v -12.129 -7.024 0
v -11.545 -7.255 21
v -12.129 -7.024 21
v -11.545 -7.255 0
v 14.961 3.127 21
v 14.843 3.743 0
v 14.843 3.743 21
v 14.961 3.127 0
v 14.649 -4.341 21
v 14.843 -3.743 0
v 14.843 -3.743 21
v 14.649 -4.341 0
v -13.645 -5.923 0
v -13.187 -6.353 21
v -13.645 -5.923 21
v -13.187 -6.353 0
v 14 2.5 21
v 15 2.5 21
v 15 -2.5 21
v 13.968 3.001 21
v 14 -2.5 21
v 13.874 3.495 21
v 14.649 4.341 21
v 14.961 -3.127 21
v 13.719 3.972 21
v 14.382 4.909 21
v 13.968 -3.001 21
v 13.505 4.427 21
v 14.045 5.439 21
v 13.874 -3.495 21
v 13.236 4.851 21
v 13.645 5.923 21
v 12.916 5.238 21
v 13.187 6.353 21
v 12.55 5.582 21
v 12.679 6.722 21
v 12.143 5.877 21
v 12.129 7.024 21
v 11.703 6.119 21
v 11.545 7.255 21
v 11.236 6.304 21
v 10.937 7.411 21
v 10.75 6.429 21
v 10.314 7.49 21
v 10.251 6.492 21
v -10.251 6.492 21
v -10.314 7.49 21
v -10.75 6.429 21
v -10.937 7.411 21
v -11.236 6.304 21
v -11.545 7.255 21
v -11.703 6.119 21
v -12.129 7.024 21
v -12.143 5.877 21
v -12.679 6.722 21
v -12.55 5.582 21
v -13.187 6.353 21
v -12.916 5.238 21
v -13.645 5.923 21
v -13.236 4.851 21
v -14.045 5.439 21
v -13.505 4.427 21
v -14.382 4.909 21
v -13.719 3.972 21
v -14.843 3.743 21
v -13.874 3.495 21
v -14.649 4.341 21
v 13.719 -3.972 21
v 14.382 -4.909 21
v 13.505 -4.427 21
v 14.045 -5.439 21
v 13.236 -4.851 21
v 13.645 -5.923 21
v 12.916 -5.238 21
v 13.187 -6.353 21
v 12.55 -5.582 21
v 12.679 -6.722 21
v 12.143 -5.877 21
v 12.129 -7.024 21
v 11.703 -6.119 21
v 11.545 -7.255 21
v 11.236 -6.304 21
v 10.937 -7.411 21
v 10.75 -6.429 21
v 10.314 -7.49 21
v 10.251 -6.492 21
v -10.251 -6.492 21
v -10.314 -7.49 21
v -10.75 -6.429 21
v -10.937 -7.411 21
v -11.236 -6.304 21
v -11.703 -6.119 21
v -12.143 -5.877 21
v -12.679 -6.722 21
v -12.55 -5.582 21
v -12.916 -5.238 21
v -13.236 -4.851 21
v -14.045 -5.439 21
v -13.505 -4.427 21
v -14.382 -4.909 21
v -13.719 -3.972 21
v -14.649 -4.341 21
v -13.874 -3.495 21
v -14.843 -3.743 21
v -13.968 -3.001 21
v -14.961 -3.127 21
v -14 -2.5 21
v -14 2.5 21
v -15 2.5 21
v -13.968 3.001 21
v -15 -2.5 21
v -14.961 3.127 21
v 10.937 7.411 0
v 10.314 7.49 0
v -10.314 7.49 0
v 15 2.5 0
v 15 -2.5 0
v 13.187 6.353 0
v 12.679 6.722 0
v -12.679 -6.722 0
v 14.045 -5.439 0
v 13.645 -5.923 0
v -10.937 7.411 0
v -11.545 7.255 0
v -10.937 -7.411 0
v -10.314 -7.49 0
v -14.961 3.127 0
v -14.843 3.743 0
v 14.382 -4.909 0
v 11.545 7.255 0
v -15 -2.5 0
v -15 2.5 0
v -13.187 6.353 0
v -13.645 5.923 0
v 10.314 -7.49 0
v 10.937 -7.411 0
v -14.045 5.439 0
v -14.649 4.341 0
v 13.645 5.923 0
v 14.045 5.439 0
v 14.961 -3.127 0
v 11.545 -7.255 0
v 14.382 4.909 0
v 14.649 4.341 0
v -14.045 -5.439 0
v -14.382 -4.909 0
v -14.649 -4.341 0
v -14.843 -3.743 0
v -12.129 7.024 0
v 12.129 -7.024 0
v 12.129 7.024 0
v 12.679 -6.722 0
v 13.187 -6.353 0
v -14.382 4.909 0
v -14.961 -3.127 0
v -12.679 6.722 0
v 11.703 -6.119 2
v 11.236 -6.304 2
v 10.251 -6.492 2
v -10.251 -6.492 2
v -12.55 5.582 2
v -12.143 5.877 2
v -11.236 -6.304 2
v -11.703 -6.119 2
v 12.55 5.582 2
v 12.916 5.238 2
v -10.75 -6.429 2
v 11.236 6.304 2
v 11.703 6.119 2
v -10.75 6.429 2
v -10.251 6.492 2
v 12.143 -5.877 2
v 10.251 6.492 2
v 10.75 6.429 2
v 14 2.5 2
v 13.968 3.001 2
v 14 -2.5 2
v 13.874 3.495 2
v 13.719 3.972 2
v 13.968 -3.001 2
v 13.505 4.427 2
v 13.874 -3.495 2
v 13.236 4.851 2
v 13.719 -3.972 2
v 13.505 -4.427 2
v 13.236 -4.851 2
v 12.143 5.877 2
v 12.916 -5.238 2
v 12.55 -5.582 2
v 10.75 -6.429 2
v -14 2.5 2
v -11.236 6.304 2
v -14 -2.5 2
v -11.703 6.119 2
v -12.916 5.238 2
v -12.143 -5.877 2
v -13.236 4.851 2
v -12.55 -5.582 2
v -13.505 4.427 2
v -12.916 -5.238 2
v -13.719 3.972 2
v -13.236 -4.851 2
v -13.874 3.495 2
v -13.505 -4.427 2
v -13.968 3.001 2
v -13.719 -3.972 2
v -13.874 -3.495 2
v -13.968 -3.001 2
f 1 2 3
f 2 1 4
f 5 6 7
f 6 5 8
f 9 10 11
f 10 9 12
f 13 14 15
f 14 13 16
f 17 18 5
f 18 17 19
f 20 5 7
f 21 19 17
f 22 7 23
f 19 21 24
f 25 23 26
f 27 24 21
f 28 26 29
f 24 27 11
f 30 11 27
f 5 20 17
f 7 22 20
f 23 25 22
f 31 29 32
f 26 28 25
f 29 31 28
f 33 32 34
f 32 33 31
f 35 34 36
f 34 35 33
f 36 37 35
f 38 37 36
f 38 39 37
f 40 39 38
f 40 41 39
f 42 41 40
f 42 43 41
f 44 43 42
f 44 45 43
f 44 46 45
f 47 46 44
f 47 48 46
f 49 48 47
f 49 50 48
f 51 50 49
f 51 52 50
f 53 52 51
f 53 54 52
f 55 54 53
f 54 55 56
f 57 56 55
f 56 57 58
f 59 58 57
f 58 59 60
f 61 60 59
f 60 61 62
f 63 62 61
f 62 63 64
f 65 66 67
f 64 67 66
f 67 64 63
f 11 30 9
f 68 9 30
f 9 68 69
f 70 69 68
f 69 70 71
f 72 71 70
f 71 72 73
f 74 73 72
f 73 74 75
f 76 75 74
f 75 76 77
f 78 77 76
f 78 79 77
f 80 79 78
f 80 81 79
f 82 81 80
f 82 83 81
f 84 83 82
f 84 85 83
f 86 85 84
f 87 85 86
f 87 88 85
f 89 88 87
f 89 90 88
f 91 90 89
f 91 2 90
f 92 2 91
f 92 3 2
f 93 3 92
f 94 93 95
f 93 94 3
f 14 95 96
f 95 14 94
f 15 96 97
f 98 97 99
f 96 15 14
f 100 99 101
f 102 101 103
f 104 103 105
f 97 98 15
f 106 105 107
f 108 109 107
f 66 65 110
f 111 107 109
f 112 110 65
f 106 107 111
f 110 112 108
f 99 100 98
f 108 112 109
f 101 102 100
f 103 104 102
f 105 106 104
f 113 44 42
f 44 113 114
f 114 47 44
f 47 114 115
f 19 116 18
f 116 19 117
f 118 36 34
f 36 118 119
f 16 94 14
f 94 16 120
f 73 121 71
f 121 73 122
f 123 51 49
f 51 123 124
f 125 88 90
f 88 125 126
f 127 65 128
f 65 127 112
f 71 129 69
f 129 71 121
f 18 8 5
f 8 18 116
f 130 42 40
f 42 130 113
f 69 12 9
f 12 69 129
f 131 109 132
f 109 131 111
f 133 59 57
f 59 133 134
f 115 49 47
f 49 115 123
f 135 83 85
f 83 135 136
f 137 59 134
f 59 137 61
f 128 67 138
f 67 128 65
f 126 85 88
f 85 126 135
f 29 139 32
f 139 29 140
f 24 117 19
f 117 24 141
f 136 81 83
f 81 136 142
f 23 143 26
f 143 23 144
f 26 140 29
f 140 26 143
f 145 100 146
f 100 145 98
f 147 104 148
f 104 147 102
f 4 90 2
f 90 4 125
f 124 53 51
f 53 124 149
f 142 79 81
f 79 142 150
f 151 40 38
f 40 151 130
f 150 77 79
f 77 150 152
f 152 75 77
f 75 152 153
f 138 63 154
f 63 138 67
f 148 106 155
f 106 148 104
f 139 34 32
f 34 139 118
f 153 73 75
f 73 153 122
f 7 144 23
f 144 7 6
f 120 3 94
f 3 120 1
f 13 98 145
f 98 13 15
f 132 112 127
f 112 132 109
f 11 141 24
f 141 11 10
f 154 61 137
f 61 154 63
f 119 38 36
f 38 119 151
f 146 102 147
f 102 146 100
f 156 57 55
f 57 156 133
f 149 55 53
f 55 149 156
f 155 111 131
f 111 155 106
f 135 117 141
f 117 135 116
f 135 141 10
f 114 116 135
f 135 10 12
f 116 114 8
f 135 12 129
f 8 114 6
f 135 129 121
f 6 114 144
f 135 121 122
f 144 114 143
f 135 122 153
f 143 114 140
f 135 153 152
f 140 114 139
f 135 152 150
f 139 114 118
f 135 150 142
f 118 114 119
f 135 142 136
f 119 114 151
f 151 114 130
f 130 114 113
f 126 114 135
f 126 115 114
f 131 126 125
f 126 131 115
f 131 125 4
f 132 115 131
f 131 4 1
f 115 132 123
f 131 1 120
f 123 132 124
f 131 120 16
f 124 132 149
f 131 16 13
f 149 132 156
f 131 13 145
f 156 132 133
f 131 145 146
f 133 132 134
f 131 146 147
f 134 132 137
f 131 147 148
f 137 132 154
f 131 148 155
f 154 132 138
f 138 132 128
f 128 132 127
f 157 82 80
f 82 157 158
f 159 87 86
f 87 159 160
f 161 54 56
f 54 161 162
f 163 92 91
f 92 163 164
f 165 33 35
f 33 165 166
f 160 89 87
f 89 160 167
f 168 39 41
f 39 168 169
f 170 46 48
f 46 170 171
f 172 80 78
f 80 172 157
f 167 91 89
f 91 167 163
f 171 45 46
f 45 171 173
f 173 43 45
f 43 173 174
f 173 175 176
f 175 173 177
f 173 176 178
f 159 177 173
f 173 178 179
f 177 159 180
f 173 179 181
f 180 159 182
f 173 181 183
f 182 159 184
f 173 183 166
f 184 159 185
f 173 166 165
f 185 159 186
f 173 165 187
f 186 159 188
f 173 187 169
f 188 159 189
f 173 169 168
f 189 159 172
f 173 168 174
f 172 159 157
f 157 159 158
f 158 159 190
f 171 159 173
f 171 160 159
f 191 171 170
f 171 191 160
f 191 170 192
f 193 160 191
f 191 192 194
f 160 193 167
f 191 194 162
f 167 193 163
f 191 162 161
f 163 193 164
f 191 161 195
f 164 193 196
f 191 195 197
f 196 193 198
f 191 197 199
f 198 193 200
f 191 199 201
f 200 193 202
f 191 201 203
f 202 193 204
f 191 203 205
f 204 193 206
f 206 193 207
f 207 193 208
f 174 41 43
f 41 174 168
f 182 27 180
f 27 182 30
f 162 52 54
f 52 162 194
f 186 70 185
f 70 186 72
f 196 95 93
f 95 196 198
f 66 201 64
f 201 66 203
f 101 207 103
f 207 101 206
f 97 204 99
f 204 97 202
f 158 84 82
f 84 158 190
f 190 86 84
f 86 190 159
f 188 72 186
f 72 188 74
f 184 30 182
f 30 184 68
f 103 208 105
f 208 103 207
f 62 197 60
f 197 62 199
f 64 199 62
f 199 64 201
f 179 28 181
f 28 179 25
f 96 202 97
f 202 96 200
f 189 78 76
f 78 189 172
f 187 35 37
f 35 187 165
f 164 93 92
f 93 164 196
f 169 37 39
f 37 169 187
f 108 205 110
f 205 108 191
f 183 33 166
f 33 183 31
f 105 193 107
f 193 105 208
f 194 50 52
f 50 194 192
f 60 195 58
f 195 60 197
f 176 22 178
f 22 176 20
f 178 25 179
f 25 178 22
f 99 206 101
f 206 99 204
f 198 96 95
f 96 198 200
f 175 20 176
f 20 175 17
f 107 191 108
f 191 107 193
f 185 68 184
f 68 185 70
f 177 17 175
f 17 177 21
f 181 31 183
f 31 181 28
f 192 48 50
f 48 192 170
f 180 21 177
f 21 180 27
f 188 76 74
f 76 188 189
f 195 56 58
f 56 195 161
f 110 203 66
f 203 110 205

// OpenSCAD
$fn = 50;


difference() {
	union() {
		hull() {
			translate(v = [-10.0000000000, 2.5000000000, 0]) {
				cylinder(h = 21, r = 5);
			}
			translate(v = [10.0000000000, 2.5000000000, 0]) {
				cylinder(h = 21, r = 5);
			}
			translate(v = [-10.0000000000, -2.5000000000, 0]) {
				cylinder(h = 21, r = 5);
			}
			translate(v = [10.0000000000, -2.5000000000, 0]) {
				cylinder(h = 21, r = 5);
			}
		}
	}
	union() {
		translate(v = [0, 0, 2]) {
			hull() {
				translate(v = [-10.0000000000, 2.5000000000, 0]) {
					cylinder(h = 19, r = 4);
				}
				translate(v = [10.0000000000, 2.5000000000, 0]) {
					cylinder(h = 19, r = 4);
				}
				translate(v = [-10.0000000000, -2.5000000000, 0]) {
					cylinder(h = 19, r = 4);
				}
				translate(v = [10.0000000000, -2.5000000000, 0]) {
					cylinder(h = 19, r = 4);
				}
			}
		}
	}
}
